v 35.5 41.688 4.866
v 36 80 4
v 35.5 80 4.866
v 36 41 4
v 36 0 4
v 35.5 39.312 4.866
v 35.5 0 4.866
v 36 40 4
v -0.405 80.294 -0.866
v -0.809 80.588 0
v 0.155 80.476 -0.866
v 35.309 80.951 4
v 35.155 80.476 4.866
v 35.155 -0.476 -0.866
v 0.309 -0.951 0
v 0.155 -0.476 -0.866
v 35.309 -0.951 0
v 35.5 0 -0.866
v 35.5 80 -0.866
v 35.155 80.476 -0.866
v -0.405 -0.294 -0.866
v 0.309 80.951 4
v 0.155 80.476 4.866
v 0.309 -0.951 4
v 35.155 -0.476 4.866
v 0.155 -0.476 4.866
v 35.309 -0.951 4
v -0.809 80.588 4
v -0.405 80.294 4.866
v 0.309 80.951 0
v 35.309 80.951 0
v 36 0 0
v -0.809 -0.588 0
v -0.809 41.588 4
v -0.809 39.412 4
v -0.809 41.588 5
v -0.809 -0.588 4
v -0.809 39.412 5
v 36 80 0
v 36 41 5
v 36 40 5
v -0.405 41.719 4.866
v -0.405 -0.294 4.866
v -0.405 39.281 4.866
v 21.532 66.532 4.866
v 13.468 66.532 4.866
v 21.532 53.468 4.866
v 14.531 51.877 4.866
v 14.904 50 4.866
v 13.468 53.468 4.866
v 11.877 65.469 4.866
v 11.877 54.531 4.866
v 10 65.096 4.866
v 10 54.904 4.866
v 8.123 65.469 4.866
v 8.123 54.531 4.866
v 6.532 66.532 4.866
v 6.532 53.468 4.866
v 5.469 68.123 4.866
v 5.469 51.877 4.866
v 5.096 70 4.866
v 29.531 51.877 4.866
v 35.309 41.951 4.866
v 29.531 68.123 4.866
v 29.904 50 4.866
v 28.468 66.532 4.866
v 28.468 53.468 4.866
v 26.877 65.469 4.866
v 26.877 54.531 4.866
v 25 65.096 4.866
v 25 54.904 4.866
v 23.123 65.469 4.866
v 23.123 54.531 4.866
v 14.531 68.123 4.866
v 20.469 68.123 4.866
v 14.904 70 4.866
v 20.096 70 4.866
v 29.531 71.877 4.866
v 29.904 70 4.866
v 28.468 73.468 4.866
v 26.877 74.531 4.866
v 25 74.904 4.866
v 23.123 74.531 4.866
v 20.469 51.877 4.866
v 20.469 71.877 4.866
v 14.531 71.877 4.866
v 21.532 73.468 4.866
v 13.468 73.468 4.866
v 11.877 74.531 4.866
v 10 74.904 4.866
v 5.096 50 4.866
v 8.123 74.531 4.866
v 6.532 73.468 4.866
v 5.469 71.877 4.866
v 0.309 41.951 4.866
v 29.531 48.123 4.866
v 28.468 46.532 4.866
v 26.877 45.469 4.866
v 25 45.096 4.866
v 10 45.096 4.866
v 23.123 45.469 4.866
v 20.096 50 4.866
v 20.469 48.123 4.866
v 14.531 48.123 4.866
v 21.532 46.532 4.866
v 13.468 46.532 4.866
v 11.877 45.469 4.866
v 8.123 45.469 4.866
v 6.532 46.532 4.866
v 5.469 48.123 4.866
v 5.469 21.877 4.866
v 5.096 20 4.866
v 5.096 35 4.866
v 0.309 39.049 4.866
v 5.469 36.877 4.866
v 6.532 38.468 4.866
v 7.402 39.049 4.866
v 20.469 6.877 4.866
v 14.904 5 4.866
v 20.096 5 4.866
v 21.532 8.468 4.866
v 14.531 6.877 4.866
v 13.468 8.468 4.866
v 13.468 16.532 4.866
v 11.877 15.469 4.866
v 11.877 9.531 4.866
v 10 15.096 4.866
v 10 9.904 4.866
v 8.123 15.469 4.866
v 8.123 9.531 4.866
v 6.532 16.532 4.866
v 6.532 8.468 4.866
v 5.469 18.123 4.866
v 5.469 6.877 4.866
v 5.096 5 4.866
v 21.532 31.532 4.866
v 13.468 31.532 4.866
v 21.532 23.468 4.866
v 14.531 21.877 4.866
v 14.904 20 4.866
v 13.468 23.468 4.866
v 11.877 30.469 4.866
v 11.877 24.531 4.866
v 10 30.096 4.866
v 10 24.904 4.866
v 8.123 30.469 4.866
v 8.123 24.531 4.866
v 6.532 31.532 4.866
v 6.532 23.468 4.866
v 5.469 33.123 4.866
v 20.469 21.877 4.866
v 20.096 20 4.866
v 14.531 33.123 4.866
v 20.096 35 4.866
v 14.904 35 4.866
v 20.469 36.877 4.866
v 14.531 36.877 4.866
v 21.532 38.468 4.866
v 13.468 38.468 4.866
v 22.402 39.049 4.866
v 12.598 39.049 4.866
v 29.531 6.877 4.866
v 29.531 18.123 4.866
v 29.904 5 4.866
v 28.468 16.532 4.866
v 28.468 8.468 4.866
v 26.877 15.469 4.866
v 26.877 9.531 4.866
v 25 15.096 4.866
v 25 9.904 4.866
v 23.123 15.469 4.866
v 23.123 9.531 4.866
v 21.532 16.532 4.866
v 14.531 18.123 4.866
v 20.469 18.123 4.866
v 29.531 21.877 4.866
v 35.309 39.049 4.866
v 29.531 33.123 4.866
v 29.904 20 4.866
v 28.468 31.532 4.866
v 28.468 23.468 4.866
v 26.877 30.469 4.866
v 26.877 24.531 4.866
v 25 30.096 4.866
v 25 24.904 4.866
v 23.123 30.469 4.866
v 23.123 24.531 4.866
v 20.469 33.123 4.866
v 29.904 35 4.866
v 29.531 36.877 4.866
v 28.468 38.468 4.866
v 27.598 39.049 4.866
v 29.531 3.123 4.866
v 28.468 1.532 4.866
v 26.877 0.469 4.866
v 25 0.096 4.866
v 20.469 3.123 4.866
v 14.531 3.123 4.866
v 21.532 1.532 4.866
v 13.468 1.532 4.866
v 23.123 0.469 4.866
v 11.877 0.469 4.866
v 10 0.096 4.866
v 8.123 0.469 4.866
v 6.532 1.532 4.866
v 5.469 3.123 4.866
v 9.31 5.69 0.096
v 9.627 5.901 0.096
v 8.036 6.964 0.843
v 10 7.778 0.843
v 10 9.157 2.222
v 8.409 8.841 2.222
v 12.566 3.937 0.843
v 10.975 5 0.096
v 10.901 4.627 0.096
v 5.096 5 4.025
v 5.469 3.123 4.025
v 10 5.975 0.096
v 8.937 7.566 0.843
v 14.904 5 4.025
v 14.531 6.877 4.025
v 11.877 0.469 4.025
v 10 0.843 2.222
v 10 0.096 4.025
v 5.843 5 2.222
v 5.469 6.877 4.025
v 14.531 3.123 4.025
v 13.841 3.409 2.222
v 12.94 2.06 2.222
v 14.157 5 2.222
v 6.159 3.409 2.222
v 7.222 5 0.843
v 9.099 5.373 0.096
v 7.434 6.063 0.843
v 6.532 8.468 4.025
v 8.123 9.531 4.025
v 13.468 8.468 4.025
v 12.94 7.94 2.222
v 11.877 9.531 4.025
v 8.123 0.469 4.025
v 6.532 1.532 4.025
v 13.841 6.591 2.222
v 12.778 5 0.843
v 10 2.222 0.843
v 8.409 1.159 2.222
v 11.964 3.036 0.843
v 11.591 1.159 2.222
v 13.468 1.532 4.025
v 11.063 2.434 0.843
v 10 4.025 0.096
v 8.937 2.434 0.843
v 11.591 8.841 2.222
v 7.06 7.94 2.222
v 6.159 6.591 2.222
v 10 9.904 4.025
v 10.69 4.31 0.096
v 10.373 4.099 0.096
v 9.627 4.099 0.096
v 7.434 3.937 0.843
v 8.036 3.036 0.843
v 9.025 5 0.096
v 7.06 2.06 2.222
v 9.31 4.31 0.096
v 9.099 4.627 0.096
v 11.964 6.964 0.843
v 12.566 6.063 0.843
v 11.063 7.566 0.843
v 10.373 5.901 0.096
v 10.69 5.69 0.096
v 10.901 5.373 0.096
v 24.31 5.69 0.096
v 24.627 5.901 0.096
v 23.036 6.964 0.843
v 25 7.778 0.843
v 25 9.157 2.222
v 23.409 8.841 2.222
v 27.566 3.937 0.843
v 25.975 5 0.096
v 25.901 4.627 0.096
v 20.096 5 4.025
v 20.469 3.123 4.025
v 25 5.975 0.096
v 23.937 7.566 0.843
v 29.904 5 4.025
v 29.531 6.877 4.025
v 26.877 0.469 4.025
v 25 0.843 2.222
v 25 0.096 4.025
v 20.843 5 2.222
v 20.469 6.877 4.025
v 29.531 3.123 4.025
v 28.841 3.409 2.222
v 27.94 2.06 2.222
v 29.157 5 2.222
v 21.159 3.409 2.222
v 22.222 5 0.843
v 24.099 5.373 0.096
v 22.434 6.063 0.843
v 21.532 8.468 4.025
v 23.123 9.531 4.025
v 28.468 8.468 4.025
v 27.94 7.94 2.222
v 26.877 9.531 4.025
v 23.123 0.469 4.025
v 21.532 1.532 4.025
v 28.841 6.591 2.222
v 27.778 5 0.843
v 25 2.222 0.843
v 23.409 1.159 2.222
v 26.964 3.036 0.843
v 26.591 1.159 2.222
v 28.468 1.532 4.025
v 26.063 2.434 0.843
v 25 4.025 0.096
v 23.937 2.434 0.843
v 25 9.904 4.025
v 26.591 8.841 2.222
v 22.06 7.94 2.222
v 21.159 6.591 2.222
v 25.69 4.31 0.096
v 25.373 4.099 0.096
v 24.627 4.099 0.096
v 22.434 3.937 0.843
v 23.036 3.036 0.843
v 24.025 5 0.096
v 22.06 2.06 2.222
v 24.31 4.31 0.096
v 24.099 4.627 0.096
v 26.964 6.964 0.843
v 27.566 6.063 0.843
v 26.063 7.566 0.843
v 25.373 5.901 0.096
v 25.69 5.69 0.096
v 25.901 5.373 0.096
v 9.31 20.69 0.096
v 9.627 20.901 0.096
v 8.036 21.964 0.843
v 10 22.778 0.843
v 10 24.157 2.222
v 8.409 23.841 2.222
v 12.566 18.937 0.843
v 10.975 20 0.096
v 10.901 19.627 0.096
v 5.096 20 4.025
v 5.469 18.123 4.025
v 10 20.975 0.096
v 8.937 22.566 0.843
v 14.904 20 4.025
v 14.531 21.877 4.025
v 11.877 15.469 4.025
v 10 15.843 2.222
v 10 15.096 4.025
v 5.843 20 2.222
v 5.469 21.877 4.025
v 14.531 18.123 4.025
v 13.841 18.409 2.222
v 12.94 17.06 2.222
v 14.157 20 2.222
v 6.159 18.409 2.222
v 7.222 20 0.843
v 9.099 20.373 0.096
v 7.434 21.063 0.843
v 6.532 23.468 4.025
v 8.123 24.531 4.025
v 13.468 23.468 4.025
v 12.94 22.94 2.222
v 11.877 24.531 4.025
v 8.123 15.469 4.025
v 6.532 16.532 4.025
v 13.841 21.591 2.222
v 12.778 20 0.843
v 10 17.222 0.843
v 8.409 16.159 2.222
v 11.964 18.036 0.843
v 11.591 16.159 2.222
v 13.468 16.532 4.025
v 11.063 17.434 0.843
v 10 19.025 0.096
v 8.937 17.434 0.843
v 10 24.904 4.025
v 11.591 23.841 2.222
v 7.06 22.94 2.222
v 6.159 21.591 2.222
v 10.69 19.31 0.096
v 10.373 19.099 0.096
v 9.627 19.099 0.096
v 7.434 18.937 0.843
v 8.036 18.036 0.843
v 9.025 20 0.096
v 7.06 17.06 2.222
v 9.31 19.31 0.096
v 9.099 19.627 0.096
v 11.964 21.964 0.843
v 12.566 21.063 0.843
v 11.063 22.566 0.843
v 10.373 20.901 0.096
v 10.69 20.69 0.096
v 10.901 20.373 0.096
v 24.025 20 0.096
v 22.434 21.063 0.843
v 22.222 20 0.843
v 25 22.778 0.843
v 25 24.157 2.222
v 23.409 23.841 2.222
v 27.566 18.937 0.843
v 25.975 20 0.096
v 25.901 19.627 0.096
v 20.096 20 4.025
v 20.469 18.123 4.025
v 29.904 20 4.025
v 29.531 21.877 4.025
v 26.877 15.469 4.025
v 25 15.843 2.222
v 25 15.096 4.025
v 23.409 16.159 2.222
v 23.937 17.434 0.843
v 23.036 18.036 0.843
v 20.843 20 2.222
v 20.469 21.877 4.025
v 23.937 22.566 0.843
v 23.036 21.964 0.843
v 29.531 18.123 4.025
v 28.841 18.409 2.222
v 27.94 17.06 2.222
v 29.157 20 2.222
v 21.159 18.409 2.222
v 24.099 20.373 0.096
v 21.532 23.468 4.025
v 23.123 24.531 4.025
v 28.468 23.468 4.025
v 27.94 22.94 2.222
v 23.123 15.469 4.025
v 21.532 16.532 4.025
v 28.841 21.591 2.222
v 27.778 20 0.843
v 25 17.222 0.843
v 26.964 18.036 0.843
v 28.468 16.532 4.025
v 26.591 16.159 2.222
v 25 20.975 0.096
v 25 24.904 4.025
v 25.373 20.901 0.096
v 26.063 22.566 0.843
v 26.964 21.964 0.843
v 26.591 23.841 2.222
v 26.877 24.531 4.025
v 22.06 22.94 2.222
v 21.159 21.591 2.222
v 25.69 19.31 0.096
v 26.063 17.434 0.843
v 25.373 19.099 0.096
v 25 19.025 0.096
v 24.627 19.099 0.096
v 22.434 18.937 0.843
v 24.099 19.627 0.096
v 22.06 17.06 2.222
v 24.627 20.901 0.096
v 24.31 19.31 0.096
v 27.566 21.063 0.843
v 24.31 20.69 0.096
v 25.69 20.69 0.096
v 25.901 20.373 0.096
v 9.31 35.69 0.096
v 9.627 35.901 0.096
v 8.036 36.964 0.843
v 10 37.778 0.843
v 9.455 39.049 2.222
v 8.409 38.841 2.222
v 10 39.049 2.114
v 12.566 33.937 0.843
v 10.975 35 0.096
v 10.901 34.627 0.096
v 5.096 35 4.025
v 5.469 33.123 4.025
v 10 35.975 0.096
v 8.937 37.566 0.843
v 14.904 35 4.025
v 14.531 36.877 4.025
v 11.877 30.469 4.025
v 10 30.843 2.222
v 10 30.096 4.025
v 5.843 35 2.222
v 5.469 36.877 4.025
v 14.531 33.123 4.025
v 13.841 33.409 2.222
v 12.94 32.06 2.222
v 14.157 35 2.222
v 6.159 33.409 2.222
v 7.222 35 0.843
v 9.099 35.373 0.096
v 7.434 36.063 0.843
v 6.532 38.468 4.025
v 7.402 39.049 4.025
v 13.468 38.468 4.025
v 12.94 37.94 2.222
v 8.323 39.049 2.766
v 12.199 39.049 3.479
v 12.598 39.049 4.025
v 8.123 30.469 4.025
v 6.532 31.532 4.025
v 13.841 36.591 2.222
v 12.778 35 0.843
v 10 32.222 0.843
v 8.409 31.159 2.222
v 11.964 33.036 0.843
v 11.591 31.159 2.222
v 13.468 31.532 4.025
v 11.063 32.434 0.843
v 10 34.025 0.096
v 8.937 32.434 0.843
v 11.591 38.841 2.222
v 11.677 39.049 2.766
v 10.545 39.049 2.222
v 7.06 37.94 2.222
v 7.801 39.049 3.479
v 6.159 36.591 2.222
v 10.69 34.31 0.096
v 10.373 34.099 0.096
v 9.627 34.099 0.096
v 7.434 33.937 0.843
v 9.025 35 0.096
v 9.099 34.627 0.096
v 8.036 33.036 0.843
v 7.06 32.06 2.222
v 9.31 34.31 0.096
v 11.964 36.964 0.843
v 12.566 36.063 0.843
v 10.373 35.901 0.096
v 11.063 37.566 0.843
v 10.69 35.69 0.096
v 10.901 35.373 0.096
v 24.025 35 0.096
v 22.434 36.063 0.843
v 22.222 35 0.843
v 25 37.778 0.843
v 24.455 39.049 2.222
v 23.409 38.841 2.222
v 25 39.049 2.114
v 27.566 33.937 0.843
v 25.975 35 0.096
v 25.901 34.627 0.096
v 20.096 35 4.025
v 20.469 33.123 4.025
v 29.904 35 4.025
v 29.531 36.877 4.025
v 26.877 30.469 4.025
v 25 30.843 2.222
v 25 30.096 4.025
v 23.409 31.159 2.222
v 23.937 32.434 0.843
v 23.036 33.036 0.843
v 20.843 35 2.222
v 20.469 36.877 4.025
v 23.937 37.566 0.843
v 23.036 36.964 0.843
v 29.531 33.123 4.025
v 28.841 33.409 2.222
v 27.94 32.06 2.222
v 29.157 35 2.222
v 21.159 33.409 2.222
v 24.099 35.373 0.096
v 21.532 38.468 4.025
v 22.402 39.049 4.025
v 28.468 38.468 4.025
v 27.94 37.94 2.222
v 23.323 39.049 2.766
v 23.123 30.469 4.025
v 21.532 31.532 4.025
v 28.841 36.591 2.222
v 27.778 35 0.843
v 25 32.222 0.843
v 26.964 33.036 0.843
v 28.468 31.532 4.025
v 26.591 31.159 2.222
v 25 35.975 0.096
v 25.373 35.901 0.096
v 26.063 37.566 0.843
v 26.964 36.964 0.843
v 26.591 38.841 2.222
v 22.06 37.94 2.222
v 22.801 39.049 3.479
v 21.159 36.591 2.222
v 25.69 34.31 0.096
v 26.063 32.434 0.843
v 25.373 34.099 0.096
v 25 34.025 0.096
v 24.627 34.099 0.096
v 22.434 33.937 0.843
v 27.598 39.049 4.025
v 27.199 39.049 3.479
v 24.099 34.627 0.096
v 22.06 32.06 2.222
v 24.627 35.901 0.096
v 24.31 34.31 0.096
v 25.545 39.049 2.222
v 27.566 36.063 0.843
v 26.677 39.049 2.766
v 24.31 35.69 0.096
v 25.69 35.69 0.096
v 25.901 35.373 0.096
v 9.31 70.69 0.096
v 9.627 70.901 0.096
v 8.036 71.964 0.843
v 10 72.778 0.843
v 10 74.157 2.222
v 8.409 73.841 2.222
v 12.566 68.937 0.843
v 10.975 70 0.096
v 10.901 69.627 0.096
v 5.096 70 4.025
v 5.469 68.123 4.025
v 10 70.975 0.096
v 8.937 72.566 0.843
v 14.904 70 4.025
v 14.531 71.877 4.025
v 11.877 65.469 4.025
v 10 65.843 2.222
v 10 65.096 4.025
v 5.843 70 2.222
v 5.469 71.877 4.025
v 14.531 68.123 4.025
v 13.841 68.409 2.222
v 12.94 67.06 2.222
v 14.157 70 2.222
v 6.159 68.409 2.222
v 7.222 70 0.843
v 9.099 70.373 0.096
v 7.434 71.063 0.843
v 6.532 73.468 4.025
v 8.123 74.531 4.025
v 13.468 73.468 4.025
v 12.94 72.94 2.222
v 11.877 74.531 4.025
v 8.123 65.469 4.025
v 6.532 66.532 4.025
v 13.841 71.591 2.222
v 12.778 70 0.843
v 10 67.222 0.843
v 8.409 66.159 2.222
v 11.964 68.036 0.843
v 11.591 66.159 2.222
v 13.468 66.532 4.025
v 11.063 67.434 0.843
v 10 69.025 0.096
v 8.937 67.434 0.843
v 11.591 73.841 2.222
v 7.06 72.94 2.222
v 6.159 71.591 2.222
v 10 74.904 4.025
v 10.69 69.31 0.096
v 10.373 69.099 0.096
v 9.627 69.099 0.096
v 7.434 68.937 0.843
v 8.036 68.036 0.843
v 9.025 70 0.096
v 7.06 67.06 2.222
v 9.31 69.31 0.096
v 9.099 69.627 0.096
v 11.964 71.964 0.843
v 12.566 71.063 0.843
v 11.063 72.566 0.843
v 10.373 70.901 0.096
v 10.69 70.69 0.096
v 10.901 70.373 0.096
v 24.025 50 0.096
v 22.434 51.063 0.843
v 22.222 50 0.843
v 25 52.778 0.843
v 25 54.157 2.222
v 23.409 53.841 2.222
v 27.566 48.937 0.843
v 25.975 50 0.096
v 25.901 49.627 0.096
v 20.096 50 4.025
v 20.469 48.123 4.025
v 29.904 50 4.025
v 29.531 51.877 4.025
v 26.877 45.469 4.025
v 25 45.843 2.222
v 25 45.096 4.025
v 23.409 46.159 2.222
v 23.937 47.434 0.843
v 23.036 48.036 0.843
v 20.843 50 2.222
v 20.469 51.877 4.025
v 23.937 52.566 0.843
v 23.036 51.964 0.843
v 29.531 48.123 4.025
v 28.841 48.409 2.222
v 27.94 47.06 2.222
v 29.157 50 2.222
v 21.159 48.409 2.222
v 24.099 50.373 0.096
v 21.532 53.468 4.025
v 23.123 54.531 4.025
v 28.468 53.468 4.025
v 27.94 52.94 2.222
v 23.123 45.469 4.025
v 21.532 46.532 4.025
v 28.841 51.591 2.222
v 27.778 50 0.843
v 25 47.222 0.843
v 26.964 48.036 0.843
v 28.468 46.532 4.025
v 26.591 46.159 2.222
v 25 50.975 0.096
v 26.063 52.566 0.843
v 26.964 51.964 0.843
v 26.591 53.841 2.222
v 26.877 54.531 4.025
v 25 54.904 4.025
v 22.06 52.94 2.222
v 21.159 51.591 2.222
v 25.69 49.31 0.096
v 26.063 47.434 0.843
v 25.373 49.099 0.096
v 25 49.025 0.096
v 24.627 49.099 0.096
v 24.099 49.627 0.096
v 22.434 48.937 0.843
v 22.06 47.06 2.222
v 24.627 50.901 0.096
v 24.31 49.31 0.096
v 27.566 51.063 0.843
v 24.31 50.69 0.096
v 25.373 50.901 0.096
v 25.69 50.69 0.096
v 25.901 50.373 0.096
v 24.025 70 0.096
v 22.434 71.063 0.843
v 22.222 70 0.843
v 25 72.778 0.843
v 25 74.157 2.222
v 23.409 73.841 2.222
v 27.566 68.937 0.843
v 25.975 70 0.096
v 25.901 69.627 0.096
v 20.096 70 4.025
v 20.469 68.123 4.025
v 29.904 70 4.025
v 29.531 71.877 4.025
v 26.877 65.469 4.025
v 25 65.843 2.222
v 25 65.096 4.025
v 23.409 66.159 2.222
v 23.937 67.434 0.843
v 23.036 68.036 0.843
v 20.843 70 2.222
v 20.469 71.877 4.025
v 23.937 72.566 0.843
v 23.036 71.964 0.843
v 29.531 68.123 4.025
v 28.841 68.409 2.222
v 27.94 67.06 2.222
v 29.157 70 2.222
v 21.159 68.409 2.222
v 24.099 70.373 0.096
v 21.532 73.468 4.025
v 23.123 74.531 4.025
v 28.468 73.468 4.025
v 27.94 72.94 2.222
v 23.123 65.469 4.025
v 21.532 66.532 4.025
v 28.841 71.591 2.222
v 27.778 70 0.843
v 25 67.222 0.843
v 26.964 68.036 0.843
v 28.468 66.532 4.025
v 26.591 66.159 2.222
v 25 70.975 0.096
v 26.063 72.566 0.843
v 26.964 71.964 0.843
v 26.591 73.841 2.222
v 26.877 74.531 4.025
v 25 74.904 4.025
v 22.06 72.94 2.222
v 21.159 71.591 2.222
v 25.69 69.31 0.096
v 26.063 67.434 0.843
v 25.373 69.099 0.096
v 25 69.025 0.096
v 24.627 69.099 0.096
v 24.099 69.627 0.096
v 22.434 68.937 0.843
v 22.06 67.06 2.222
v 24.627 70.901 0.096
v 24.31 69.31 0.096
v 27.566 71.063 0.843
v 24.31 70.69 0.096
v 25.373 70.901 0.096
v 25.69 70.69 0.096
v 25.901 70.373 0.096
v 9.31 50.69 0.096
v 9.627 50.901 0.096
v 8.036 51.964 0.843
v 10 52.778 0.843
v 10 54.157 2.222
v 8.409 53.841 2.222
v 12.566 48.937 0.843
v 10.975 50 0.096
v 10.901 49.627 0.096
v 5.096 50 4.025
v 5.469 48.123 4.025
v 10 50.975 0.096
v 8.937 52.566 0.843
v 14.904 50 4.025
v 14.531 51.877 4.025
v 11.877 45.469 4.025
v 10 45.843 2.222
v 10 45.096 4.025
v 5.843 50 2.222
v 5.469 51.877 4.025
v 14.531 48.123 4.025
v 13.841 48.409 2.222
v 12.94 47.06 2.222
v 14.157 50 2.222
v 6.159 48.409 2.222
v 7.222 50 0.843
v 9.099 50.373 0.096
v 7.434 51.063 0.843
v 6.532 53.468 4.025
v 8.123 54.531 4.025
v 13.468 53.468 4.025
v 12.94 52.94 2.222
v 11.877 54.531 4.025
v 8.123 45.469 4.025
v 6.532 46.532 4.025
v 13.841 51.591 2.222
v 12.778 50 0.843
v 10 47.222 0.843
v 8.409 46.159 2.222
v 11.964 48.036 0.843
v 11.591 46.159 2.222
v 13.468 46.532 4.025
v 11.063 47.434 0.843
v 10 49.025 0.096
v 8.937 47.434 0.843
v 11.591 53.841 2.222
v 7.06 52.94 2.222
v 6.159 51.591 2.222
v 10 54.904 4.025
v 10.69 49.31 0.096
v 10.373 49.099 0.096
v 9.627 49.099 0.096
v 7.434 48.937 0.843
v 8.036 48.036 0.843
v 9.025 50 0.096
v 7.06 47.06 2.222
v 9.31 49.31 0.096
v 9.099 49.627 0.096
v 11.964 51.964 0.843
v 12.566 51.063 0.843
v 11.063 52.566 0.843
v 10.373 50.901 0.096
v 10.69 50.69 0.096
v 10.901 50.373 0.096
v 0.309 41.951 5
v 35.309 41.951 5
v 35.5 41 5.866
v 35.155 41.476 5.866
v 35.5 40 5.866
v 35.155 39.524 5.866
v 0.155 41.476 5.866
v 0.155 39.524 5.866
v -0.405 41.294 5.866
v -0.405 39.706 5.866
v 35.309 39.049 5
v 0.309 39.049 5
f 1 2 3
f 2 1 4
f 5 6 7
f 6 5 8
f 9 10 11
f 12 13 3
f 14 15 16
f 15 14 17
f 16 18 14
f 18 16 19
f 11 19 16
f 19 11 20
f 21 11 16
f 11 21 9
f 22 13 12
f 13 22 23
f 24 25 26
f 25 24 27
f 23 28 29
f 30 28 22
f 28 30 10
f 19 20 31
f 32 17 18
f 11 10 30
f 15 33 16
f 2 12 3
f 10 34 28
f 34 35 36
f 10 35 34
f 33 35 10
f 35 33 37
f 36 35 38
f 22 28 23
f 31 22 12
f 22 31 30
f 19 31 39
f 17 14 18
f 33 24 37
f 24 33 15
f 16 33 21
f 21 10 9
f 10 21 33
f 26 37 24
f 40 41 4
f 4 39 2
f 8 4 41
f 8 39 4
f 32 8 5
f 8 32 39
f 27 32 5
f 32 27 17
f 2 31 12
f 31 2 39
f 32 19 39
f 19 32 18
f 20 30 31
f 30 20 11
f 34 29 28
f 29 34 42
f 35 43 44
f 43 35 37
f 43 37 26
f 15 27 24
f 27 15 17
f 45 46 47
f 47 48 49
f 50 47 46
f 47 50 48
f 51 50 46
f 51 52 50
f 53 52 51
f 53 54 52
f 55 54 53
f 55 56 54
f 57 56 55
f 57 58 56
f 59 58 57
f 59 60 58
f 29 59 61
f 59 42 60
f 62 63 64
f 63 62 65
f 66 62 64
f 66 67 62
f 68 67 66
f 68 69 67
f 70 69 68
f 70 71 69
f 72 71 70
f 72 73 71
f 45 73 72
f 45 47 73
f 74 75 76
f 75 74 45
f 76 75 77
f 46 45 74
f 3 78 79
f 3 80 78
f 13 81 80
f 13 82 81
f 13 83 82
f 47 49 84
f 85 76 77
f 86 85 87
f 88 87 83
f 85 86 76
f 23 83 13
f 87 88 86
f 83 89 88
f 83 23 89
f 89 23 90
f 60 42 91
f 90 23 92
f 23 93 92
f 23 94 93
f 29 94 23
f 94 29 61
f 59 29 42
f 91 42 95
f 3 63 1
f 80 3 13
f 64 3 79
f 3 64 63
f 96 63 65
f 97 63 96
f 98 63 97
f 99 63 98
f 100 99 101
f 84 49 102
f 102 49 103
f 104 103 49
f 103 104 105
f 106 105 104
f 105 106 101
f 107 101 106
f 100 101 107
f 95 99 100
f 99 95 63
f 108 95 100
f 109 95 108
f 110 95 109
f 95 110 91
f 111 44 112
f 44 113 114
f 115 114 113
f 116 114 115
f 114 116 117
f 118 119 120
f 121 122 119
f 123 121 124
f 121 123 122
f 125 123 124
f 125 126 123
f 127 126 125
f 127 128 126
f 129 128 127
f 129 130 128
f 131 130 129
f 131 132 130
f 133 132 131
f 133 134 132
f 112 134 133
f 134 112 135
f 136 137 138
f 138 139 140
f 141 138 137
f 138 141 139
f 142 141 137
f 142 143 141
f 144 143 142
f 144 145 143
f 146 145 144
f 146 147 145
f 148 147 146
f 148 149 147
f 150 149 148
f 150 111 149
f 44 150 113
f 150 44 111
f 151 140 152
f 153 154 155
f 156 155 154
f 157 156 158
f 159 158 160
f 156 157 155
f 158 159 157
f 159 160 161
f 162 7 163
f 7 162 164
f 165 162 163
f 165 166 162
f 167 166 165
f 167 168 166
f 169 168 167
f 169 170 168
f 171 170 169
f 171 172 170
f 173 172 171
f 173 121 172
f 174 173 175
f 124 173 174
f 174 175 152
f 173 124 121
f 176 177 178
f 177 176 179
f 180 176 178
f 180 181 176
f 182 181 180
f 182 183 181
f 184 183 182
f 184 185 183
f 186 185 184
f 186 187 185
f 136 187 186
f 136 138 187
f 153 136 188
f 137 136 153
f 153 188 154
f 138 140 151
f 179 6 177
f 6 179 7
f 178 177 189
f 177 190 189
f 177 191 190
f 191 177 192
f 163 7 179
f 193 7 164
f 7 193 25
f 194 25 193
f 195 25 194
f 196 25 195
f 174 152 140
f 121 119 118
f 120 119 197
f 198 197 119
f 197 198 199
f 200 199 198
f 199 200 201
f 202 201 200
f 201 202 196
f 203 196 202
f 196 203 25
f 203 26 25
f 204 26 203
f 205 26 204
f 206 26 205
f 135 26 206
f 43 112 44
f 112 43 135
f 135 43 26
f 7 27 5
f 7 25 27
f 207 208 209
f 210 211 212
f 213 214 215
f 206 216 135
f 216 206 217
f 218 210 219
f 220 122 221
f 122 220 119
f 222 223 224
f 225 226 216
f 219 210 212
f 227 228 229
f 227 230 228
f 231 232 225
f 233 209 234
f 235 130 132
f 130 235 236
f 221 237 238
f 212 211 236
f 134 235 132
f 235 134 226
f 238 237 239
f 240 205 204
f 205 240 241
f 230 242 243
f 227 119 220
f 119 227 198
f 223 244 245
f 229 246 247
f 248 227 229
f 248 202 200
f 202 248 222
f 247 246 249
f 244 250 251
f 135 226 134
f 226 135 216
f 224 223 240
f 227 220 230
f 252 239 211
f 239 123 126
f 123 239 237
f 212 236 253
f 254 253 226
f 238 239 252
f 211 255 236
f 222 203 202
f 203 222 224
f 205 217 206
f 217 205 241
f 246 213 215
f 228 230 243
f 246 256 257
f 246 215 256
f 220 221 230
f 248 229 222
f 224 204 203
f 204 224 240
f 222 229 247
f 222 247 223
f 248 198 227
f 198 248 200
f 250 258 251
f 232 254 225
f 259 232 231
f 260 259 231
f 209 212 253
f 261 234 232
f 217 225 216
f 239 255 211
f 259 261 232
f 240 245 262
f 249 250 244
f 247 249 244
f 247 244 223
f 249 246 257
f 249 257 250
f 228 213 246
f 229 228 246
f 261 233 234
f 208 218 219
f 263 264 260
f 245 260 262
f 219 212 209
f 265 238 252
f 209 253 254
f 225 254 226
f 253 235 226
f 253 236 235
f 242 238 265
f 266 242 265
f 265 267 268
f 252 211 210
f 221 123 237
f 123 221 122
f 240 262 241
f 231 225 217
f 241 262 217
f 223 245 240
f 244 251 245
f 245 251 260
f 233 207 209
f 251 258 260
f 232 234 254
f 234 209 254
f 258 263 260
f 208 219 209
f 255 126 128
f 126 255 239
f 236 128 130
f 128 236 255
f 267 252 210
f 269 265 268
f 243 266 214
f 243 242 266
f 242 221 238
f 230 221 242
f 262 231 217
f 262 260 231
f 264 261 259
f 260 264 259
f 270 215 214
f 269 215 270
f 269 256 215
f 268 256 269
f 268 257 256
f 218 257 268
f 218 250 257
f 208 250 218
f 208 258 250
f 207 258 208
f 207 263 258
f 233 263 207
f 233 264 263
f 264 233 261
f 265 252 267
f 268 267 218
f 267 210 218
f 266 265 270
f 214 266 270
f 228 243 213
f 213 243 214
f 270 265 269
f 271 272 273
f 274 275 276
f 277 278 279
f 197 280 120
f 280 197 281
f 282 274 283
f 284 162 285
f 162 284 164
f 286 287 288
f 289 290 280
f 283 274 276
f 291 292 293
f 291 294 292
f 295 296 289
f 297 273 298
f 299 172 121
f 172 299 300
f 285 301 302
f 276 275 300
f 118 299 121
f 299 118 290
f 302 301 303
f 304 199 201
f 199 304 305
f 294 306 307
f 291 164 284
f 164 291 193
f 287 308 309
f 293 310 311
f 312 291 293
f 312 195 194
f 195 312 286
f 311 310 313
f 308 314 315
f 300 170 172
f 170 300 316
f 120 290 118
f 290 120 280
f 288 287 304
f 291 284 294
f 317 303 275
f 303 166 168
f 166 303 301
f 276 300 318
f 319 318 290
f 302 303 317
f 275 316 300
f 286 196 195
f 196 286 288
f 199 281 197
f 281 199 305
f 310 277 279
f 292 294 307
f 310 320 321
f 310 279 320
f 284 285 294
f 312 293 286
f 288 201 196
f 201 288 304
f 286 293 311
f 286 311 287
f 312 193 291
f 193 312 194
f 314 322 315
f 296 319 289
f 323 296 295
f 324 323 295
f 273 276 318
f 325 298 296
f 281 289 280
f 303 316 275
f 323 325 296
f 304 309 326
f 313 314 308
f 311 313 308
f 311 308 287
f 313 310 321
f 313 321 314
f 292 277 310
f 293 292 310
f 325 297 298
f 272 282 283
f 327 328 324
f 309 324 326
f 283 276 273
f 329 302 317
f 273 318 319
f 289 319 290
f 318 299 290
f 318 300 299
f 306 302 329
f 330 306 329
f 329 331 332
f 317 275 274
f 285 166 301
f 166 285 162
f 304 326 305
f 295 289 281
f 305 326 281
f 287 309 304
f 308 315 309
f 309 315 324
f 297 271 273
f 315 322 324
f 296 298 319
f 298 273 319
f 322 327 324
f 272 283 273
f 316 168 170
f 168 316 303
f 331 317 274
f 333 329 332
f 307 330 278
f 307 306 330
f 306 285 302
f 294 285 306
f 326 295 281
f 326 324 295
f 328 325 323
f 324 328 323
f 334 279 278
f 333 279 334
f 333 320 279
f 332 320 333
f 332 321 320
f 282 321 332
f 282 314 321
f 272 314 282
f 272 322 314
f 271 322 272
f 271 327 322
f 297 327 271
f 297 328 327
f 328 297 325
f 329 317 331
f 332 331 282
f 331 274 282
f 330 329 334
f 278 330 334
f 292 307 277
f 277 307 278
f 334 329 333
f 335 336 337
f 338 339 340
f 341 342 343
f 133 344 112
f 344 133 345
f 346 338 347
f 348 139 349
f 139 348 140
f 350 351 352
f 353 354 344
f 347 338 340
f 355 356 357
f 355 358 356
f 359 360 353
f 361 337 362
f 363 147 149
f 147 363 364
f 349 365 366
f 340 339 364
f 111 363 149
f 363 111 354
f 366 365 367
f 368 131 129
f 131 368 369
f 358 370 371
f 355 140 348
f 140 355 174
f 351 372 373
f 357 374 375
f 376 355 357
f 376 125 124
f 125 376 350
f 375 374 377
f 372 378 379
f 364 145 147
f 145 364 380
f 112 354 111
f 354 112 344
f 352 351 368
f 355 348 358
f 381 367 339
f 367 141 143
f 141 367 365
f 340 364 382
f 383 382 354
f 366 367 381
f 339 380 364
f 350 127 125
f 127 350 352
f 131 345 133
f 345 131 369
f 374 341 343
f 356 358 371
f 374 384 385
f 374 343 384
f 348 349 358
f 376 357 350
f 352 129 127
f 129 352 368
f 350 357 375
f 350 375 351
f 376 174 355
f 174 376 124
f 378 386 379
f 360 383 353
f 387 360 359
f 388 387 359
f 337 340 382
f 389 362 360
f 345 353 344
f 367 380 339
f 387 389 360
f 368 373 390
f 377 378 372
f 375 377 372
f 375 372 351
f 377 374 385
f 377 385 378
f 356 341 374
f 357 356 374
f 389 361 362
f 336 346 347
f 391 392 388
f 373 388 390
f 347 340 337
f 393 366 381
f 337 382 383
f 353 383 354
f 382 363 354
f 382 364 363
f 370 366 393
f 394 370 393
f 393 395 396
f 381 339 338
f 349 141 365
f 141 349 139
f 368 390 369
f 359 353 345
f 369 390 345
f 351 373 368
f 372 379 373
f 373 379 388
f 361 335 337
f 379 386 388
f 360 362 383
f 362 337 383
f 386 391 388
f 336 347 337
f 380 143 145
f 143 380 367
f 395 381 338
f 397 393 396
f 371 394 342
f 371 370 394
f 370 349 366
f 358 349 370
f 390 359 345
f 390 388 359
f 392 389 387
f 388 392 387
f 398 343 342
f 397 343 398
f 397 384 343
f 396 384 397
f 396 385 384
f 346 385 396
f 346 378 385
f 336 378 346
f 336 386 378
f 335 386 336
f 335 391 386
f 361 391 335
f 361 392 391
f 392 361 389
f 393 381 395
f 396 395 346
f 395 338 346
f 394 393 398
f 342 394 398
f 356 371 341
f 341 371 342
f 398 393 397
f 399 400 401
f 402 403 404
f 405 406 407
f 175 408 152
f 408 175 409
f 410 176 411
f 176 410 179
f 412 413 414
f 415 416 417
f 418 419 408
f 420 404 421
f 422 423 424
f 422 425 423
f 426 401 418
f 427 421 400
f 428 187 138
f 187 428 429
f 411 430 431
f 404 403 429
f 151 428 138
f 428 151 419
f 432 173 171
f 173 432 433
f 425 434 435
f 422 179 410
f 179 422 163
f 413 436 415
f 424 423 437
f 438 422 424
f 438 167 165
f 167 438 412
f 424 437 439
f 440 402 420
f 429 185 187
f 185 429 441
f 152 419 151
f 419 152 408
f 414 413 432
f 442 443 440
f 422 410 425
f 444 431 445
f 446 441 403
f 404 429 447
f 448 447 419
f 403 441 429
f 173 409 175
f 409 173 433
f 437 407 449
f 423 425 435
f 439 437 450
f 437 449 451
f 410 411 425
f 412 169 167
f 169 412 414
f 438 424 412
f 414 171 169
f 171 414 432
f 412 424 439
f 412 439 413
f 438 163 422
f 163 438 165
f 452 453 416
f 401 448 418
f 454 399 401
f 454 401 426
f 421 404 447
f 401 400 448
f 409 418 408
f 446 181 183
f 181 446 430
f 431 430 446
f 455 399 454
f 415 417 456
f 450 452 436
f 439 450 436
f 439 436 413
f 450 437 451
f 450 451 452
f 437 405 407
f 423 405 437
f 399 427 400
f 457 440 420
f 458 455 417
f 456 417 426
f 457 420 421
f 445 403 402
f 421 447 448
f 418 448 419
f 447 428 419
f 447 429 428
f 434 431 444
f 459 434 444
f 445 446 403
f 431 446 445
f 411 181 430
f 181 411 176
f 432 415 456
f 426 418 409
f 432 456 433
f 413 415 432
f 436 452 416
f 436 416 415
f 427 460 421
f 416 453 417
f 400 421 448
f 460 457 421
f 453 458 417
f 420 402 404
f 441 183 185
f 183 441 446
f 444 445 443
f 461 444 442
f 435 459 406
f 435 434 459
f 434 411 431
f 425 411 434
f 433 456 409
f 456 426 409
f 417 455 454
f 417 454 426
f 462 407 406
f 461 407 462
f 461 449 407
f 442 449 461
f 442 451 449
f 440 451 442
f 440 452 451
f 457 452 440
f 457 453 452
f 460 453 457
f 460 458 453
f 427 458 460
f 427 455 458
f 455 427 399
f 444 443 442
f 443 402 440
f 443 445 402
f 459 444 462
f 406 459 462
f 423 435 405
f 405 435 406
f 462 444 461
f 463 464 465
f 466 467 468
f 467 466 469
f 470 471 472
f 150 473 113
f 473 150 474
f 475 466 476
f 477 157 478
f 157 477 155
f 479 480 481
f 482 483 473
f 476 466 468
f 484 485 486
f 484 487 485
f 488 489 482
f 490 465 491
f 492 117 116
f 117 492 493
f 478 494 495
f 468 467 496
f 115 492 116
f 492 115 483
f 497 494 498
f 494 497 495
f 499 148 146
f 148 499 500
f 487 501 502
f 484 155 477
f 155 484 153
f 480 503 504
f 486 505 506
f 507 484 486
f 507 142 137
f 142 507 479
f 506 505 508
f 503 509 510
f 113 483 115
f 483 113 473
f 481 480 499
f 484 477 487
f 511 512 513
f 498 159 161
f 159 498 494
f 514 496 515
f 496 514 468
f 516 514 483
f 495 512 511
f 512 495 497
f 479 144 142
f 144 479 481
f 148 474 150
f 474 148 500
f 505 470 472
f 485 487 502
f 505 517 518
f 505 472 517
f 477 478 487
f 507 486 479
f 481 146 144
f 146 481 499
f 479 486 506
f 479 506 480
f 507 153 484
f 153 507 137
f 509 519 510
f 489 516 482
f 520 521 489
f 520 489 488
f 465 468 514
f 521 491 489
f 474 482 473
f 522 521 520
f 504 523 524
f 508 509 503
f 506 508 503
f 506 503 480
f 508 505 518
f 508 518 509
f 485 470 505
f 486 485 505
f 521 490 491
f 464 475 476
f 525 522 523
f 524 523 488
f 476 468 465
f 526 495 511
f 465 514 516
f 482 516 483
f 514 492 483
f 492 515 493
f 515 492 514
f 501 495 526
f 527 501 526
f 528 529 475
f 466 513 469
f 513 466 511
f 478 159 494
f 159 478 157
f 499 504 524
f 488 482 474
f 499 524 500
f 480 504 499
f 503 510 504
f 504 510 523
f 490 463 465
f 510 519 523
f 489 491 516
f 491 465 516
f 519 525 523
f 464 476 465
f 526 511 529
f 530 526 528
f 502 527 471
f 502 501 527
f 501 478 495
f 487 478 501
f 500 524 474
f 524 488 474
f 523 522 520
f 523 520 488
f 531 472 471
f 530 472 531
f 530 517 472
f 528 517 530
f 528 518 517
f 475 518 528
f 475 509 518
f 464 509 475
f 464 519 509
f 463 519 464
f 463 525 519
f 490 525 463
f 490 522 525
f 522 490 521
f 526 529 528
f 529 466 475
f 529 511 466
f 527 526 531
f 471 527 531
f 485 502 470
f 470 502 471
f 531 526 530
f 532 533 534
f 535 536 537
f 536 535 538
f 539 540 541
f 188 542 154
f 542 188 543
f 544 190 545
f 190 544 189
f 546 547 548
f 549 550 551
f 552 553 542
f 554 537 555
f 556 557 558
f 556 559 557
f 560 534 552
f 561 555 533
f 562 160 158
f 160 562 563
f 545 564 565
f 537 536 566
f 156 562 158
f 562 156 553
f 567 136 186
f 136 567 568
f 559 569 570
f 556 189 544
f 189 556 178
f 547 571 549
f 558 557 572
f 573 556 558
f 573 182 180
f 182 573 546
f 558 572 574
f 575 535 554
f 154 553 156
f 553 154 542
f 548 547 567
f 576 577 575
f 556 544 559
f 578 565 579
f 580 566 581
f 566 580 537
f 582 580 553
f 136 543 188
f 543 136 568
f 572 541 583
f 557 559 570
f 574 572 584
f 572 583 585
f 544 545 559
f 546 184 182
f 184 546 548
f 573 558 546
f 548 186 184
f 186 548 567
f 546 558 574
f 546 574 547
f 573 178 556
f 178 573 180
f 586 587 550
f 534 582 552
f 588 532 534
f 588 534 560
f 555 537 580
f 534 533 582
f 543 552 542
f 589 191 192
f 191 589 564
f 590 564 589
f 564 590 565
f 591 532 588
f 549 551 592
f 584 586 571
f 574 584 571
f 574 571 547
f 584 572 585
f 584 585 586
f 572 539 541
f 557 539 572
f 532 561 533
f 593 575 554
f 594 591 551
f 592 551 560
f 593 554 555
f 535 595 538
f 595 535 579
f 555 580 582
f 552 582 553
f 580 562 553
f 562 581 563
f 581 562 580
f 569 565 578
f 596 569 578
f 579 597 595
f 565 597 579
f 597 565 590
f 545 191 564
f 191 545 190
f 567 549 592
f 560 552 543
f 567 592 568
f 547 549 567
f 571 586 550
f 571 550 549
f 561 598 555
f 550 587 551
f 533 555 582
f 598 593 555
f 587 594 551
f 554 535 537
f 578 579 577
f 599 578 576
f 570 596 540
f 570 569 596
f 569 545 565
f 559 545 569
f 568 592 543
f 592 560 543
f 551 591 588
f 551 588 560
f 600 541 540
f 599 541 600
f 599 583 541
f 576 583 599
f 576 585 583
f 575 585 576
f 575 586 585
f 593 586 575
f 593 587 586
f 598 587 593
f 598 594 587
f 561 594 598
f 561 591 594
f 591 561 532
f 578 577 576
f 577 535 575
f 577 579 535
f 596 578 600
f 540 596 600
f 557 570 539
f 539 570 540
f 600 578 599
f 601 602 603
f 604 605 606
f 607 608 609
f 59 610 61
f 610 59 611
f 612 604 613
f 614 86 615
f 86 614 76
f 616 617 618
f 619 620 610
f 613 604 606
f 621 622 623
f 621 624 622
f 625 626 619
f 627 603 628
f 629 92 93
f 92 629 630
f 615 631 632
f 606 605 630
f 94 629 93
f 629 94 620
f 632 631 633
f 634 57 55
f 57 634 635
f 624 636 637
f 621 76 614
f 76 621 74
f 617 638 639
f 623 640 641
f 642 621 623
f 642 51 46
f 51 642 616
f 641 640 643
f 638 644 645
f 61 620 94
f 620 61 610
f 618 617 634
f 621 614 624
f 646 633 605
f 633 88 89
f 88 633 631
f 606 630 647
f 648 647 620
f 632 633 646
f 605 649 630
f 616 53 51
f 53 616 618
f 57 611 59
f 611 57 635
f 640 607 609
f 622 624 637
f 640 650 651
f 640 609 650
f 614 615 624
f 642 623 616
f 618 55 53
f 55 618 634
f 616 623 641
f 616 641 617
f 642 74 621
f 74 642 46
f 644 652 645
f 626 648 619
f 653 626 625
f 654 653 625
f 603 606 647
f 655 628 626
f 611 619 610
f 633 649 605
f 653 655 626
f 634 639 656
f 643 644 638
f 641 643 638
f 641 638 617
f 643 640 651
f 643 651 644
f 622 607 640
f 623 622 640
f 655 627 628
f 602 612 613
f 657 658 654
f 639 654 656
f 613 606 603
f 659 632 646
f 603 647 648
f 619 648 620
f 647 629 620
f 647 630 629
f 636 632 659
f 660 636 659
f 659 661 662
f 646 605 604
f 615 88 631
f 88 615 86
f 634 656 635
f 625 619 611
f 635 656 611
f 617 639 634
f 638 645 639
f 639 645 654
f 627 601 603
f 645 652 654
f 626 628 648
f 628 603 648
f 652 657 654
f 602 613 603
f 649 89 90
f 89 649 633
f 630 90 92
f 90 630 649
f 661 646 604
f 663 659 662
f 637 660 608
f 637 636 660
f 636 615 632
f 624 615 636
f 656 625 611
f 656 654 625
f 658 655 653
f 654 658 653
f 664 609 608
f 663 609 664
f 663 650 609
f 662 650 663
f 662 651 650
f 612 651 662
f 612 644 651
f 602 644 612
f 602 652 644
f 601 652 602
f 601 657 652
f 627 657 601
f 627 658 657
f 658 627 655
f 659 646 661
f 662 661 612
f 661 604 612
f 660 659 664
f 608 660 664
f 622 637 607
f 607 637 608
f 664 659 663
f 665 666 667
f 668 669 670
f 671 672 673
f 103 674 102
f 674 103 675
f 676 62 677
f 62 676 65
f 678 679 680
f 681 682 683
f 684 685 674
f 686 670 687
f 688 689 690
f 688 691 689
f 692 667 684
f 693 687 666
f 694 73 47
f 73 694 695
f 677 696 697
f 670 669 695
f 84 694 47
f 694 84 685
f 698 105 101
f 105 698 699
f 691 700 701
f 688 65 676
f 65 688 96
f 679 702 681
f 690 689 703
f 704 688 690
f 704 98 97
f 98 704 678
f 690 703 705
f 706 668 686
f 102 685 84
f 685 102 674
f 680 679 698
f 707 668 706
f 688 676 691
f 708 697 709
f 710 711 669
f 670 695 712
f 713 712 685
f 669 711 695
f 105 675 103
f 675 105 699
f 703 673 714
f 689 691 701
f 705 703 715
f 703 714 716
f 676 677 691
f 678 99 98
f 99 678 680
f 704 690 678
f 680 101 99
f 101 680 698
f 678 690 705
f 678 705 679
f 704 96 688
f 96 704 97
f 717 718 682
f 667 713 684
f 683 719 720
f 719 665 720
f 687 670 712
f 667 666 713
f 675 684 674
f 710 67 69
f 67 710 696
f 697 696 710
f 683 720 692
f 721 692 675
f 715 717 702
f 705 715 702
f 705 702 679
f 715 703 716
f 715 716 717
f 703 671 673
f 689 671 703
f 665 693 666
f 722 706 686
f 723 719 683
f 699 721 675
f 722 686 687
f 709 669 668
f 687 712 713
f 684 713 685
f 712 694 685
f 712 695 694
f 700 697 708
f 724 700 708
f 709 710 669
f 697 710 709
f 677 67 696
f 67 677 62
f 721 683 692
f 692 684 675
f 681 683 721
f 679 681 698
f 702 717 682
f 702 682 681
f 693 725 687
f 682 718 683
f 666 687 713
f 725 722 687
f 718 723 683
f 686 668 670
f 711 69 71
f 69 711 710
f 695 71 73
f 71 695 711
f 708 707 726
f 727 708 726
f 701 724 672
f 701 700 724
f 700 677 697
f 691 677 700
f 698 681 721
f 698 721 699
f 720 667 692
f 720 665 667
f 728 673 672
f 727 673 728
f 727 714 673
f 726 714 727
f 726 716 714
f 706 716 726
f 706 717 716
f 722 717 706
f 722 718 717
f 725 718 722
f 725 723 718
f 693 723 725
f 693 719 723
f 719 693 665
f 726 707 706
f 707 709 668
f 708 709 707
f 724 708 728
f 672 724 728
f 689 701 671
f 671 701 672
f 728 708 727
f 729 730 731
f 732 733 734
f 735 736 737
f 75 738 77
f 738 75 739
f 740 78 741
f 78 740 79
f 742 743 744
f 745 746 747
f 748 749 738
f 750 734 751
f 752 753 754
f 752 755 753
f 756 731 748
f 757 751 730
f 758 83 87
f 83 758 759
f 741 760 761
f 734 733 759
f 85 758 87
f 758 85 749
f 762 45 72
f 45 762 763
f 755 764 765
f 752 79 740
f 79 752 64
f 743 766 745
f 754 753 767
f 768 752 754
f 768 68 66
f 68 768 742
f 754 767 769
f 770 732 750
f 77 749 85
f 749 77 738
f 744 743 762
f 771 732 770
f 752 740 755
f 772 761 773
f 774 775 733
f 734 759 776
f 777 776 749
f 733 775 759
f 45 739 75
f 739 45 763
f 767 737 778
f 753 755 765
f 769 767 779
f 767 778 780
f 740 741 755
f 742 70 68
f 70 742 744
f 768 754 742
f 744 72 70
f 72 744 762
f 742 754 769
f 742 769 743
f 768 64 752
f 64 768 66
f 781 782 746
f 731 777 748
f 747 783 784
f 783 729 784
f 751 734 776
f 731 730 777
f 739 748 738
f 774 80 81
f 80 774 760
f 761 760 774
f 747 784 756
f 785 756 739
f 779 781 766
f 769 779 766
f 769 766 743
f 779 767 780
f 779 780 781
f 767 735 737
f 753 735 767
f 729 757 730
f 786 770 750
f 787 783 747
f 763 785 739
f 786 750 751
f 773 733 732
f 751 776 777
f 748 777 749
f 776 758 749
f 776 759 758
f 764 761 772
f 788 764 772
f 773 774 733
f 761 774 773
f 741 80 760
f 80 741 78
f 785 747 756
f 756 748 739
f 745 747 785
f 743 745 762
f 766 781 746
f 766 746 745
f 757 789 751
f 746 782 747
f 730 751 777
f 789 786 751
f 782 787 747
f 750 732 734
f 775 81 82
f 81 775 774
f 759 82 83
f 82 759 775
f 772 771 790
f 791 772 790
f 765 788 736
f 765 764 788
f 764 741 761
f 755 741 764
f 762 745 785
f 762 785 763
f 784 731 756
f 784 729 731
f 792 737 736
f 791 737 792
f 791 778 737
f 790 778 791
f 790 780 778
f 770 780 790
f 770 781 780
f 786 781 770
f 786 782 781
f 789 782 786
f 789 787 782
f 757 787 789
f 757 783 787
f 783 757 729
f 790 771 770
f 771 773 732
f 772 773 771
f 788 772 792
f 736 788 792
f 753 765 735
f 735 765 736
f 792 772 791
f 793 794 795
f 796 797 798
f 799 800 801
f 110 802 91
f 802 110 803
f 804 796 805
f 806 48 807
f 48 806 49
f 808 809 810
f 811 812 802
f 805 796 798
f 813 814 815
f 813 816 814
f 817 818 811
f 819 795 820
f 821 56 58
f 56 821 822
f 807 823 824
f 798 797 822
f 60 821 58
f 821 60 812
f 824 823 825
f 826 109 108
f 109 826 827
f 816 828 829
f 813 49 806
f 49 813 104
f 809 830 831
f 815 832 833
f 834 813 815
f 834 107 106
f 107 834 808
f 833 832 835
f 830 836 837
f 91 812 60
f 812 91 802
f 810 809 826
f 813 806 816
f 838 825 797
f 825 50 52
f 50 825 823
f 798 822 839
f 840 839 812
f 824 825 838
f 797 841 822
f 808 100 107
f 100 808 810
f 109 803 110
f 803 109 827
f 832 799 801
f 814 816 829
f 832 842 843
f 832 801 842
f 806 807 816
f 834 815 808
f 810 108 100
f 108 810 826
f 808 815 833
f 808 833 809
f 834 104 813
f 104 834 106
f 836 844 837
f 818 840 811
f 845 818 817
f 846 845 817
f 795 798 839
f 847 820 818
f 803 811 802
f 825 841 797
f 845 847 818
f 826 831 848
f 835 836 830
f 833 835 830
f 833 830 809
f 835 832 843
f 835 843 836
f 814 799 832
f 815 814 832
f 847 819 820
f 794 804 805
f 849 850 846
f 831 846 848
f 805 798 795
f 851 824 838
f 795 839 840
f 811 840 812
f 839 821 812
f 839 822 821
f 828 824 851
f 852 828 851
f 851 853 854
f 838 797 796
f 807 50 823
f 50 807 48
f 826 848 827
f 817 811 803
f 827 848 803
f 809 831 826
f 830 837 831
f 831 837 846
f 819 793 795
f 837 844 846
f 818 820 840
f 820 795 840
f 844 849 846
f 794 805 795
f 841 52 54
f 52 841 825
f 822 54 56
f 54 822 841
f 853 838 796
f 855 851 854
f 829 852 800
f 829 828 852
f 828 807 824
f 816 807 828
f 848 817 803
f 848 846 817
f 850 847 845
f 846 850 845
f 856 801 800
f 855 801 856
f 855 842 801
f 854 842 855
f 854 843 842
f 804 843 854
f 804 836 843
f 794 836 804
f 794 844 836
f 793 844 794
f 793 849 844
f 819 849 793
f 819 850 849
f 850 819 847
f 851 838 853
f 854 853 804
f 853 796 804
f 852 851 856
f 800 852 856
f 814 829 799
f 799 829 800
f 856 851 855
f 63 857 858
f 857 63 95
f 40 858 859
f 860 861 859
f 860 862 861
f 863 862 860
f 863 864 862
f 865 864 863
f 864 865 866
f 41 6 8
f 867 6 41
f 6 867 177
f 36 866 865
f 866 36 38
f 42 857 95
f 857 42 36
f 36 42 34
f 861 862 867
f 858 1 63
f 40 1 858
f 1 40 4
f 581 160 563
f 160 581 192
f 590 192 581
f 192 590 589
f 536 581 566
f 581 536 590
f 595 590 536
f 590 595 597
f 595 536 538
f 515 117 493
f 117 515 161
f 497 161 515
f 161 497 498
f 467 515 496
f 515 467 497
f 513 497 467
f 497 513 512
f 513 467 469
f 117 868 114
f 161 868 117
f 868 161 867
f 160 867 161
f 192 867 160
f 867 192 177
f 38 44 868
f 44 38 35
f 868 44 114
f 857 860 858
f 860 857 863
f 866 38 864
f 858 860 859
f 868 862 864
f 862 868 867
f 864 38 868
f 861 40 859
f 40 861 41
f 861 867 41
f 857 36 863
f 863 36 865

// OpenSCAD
// Loguncov Maxim 13.12.13


//$fn=128;


translate([0,40,0])
minkowski()
{cube([35,1,5]);
sphere(1);
}

difference() {

//основа
minkowski()
{cube([35,80,4]);
sphere(1);
}

//отверстия
translate([10,5,5])sphere(5);
translate([25,5,5])sphere(5);
translate([10,20,5])sphere(5);
translate([25,20,5])sphere(5);
translate([10,35,5])sphere(5);
translate([25,35,5])sphere(5);

translate([10,70,5])sphere(5);
translate([25,50,5])sphere(5);
translate([25,70,5])sphere(5);
translate([10,50,5])sphere(5);

}
